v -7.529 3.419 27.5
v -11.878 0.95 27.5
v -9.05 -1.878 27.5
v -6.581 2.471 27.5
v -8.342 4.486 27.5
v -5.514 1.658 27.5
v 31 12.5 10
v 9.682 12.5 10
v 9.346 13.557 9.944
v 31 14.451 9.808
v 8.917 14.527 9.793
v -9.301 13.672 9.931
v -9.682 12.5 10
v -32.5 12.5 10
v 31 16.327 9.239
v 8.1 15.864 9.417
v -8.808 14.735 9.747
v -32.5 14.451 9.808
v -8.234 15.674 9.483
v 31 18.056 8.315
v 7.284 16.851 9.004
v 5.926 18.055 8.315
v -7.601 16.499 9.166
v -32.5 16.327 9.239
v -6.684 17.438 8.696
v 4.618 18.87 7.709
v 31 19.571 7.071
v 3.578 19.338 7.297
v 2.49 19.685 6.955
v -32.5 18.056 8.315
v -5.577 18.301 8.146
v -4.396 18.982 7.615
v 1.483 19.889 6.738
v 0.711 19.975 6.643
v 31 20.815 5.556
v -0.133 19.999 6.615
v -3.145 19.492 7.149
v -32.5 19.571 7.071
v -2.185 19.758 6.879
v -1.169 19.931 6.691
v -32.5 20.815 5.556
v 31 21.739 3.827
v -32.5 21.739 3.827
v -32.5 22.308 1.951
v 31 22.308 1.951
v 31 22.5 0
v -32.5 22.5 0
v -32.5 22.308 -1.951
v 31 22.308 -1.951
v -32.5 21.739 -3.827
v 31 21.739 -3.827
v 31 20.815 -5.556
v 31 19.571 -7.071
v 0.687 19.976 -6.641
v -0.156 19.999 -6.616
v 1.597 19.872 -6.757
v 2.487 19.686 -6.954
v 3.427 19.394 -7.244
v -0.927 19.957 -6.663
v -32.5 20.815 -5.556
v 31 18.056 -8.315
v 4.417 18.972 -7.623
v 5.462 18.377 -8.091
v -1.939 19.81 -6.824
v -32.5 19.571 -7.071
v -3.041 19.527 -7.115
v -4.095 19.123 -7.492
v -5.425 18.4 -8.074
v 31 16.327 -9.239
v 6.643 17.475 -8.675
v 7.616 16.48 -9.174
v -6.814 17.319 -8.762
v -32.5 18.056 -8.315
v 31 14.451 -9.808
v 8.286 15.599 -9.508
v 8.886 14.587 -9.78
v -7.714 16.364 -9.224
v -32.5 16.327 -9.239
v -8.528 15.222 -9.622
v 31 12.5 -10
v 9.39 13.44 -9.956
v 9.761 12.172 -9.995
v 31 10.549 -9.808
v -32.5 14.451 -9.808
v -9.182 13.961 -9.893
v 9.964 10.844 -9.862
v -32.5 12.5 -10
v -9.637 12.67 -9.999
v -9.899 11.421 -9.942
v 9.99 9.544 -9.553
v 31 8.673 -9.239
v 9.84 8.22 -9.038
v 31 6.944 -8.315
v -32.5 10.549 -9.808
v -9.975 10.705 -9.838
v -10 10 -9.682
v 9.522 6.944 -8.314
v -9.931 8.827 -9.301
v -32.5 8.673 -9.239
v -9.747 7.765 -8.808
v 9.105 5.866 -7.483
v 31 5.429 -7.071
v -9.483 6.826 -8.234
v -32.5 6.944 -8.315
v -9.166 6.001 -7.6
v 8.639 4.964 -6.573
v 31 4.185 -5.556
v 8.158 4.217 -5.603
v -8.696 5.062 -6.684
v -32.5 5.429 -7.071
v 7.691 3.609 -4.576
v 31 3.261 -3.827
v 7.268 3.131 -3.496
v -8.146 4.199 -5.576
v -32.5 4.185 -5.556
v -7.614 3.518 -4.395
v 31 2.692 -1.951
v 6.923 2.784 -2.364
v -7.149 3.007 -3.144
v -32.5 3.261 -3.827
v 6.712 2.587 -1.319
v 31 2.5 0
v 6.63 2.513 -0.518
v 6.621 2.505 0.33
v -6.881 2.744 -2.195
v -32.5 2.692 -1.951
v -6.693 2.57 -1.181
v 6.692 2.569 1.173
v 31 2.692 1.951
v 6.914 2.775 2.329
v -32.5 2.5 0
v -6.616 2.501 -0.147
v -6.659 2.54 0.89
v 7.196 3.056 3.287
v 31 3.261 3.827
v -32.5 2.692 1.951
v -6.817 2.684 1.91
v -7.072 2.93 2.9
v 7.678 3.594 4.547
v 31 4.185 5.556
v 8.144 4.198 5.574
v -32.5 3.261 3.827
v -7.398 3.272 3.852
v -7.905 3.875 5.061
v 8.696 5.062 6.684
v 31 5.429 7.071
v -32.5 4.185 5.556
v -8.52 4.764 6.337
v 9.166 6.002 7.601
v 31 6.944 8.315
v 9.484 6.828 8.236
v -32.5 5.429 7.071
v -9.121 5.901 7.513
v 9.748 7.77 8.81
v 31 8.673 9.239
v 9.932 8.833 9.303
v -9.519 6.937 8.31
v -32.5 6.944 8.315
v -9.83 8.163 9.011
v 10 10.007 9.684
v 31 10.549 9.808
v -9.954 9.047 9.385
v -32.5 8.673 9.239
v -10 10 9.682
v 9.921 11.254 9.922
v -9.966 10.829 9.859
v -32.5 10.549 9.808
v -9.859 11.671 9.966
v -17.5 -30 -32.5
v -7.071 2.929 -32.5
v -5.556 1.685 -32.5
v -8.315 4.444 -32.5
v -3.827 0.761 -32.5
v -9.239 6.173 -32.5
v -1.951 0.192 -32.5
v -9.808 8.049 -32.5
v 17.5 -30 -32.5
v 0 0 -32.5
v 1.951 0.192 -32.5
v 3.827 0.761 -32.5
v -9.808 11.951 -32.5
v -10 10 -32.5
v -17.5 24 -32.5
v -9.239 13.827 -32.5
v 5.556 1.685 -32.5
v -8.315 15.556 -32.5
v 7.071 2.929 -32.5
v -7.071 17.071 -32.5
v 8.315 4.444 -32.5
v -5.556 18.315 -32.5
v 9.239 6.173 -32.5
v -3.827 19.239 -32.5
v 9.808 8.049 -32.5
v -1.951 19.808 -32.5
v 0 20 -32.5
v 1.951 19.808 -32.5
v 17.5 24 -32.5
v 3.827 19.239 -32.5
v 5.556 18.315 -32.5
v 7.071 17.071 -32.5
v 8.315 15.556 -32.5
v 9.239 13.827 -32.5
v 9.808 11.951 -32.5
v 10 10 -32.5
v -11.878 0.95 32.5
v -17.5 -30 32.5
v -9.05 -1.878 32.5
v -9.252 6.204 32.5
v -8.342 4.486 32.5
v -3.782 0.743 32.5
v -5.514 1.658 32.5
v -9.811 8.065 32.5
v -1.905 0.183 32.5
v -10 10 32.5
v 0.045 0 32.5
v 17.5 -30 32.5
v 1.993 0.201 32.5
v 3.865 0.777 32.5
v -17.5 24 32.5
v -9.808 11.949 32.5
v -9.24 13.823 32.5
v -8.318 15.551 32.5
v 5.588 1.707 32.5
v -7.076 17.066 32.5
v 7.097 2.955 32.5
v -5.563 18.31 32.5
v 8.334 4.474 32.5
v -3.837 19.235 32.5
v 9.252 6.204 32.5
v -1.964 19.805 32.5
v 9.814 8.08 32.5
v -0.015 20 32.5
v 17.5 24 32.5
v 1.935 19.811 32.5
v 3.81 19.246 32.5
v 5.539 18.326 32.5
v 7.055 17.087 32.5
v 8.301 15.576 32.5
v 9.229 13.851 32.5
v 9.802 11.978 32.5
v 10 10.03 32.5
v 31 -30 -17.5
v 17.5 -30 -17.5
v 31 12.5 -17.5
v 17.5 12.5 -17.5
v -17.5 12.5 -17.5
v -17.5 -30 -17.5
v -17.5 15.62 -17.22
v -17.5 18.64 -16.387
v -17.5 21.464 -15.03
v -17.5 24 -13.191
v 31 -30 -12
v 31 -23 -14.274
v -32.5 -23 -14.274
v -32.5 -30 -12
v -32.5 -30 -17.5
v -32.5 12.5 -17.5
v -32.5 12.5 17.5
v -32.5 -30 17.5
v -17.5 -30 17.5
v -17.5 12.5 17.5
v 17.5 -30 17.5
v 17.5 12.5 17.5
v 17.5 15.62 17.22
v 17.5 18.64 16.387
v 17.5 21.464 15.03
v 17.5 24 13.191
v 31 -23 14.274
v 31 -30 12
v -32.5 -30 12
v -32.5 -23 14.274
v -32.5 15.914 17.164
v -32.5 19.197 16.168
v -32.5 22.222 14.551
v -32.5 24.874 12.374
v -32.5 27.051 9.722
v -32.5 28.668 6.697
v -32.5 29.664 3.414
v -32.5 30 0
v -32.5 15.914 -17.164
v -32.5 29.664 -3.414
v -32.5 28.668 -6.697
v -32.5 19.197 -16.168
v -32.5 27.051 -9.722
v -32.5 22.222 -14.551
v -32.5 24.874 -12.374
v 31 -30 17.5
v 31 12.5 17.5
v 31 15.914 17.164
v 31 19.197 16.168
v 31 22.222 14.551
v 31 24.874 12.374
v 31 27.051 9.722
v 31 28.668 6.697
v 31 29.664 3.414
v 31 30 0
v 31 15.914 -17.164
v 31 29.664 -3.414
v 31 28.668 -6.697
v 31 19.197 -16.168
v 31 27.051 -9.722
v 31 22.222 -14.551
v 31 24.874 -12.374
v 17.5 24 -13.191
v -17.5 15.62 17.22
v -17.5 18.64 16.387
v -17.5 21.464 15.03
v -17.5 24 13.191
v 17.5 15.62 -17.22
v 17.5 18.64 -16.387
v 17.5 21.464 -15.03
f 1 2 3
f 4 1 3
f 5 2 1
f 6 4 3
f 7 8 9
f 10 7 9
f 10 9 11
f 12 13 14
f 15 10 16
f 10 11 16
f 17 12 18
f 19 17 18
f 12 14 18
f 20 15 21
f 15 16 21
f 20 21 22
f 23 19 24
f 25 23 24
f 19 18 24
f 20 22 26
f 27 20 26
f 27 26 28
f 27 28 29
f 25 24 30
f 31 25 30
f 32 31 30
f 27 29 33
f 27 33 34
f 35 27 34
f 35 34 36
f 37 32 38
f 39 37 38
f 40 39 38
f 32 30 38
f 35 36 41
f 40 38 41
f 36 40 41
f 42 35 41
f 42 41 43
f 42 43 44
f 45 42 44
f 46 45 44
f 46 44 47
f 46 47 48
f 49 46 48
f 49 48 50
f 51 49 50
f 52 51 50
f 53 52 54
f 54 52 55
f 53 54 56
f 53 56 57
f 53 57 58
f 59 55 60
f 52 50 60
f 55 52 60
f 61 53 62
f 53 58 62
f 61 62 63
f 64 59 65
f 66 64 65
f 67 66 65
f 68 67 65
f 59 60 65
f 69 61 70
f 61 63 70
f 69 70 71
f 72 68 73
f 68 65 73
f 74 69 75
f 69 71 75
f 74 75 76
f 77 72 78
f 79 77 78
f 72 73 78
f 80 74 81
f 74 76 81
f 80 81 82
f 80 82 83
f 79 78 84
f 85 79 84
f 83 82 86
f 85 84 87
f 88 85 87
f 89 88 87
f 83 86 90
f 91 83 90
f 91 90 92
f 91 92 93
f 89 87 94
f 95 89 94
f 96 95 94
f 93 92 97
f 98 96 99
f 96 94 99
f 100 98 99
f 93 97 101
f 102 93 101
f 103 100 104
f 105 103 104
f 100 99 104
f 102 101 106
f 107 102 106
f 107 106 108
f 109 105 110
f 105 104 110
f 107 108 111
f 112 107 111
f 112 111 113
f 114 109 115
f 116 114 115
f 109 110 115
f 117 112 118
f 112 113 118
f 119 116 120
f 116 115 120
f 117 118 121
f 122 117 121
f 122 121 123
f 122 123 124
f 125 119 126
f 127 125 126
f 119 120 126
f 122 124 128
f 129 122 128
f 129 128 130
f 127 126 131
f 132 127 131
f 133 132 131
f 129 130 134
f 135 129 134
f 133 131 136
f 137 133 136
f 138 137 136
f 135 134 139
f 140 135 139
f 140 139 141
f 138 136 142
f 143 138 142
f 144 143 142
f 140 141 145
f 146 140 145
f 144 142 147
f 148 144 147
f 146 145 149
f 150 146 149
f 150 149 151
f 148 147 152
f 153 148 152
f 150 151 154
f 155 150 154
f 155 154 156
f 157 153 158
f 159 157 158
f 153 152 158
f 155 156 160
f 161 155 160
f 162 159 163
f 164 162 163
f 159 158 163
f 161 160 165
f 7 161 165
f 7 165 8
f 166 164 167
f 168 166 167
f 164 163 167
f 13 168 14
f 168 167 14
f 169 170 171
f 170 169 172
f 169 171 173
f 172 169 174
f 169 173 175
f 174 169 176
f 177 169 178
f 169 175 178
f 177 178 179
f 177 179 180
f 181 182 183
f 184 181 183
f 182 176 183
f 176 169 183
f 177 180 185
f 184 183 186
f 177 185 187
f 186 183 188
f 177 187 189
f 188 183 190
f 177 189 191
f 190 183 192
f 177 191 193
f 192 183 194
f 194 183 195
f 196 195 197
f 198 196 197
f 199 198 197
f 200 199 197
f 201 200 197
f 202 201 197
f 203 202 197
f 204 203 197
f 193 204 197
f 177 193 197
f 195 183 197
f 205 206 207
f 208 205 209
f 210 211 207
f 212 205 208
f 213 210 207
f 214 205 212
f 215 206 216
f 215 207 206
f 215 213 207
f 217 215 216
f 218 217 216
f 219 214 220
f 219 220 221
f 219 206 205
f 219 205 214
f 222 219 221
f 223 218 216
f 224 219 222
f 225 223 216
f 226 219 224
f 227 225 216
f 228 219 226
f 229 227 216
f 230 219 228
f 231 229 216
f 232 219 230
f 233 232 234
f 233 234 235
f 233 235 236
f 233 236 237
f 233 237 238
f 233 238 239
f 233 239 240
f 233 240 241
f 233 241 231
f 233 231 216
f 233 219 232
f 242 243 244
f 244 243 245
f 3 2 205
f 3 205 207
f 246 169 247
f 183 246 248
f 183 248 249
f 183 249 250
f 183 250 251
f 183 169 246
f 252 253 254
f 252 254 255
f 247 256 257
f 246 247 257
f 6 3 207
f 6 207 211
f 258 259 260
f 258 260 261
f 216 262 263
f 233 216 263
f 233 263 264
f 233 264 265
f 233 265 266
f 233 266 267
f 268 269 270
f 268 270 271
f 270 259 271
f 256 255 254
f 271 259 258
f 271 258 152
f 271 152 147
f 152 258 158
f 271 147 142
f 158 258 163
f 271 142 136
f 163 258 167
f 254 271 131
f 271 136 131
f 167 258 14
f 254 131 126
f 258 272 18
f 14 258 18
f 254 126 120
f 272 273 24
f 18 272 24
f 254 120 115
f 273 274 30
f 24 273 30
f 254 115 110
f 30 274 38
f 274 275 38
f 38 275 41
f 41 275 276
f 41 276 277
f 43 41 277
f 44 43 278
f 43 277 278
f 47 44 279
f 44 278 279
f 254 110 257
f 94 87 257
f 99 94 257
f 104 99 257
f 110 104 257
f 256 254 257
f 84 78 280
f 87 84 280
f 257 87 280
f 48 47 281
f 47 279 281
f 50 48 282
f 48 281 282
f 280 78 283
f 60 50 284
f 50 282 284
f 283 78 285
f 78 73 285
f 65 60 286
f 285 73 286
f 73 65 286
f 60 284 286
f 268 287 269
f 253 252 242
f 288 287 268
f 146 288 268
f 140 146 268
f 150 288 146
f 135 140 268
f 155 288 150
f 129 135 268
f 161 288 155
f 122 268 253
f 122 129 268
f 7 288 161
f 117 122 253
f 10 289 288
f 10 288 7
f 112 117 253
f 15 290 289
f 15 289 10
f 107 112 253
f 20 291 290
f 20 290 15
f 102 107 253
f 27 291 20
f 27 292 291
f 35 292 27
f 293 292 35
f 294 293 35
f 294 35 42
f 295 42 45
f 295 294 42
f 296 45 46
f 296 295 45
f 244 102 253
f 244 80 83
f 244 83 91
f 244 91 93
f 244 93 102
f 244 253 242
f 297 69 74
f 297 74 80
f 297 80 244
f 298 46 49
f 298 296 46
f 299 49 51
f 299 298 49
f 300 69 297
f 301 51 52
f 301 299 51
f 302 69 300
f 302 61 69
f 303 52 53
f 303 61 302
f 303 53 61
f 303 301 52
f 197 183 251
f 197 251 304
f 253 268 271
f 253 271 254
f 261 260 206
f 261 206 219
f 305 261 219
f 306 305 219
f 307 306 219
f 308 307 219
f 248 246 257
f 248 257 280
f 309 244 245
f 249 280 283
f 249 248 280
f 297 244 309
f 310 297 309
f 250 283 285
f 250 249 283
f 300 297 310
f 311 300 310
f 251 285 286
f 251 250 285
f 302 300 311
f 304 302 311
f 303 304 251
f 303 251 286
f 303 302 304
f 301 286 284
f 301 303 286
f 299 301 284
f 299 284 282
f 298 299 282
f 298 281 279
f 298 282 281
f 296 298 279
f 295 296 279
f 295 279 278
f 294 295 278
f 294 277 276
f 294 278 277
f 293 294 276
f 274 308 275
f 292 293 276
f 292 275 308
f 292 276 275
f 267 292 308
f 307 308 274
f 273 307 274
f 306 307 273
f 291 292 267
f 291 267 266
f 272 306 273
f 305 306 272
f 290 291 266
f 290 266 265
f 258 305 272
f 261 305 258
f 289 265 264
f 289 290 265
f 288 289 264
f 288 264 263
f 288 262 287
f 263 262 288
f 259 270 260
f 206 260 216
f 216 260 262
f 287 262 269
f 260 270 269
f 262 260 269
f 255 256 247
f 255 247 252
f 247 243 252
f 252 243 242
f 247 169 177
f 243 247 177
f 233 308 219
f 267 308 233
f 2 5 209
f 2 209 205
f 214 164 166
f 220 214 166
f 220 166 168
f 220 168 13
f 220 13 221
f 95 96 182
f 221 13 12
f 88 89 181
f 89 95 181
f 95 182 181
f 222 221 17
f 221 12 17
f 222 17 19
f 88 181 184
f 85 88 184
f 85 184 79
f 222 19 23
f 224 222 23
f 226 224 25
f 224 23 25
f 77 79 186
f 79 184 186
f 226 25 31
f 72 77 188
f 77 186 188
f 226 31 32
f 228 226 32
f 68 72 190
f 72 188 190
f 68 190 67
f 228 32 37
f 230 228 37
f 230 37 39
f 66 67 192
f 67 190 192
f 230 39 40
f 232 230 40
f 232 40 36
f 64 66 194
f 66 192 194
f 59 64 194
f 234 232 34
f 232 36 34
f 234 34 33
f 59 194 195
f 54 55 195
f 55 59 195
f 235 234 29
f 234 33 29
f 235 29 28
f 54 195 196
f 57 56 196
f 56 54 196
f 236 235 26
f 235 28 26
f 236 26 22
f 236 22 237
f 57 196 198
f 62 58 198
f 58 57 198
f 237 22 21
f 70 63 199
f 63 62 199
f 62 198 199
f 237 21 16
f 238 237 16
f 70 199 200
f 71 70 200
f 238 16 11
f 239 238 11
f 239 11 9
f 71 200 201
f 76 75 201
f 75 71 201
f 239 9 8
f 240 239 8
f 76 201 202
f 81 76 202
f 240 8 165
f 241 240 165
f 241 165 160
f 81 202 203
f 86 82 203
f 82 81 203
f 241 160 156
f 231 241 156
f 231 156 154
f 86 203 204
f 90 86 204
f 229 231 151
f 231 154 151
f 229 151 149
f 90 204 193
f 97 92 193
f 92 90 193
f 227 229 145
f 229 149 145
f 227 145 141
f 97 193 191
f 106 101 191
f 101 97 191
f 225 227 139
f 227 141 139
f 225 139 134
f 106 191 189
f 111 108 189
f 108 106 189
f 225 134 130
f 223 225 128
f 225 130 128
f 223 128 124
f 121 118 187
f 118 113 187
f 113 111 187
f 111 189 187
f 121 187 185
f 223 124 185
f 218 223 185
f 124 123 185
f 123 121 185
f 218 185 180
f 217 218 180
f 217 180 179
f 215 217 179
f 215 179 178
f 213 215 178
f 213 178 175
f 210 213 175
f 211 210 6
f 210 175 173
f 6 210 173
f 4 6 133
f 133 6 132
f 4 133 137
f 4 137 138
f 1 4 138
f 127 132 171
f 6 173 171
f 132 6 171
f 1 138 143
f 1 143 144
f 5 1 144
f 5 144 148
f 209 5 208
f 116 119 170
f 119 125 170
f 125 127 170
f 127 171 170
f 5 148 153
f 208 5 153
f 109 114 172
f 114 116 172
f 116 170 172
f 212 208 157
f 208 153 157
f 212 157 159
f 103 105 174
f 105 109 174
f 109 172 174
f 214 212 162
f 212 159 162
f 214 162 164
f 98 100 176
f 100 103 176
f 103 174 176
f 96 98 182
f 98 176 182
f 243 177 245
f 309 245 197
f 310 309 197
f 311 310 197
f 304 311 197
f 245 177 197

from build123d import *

# Parameters (mm, degrees)
BOSS_EXTRUDE1_DEPTH      = 31
BOSS_EXTRUDE1_DEPTH_BACK = 32.5
SKETCH1_W                = 35
SKETCH1_H                = 60
FILLET2_RADIUS           = 17.5
FILLET2_LENGTH           = 63.5
BOSS_EXTRUDE2_DEPTH      = 32.5
BOSS_EXTRUDE2_DEPTH_BACK = 32.5
SKETCH8_W                = 35
SKETCH8_H                = 54
HOLE2_D                  = 20
CUT_EXTRUDE1_START       = -5
CUT_EXTRUDE1_DEPTH       = 5
CUT_EXTRUDE2_DEPTH       = 78.38539914
HOLE3_D                  = 20


with BuildPart() as part:
    # Sketch1 → Boss-Extrude1 (new, two sides: drawn at the far end of the back side and taken through both)
    with BuildSketch(Plane(origin=(0, 0, 0), x_dir=(0, 0, -1), z_dir=(1, 0, 0)).offset(-BOSS_EXTRUDE1_DEPTH_BACK)):
        Rectangle(SKETCH1_W, SKETCH1_H)
    extrude(amount=BOSS_EXTRUDE1_DEPTH + BOSS_EXTRUDE1_DEPTH_BACK)

    # Fillet2: full round fillet: the end face becomes a half cylinder, R = half its width
    fillet2_face = Plane((-0.75, 30, 0), x_dir=(1, 0, 0), z_dir=(0, 1, 0))  # on the end face: x along it, z out of the body
    fillet2_slab = fillet2_face.offset(-FILLET2_RADIUS / 2) * Box(FILLET2_LENGTH, 2 * FILLET2_RADIUS, FILLET2_RADIUS, mode=Mode.PRIVATE)  # the body's end, R deep
    fillet2_round = Plane((-0.75, 12.5, 0), x_dir=(0, 1, 0), z_dir=(1, 0, 0)) * Cylinder(FILLET2_RADIUS, FILLET2_LENGTH, mode=Mode.PRIVATE)  # its axis R under the face
    add(fillet2_slab - fillet2_round, mode=Mode.SUBTRACT)

    # Sketch8 → Boss-Extrude2 (add, two sides: drawn at the far end of the back side and taken through both)
    with BuildSketch(Plane.XY.offset(-BOSS_EXTRUDE2_DEPTH_BACK)):
        with Locations((0, -3)):
            Rectangle(SKETCH8_W, SKETCH8_H)
    extrude(amount=BOSS_EXTRUDE2_DEPTH + BOSS_EXTRUDE2_DEPTH_BACK)

    # Hole2 (through all)
    with Locations(Plane.XY.offset(32.5)):
        with Locations((0, 10)):
            Hole(HOLE2_D / 2)

    # Sketch14 → Cut-Extrude1 (cut)
    with BuildSketch(Plane.XY.offset(32.5).offset(CUT_EXTRUDE1_START)):
        with BuildLine():
            Line((-8.342416793, 4.486010332), (-11.877950699, 0.950476426))
            Line((-11.877950699, 0.950476426), (-9.049523574, -1.877950699))
            Line((-9.049523574, -1.877950699), (-5.513989668, 1.657583207))
            ThreePointArc((-5.513989668, 1.657583207), (-7.071067812, 2.928932188), (-8.342416793, 4.486010332))
        make_face()
    extrude(amount=CUT_EXTRUDE1_DEPTH, mode=Mode.SUBTRACT)

    # Sketch15 → Cut-Extrude2 (cut, through all)
    with BuildSketch(Plane(origin=(31, 0, 0), x_dir=(0, 0, -1), z_dir=(1, 0, 0))):
        Polygon((-12, -30), (-14.274437874, -23), (14.274437874, -23), (12, -30), align=None)
    extrude(amount=-CUT_EXTRUDE2_DEPTH, mode=Mode.SUBTRACT)

    # Hole3 (through all)
    with Locations(Plane(origin=(31, 0, 0), x_dir=(0, 0, -1), z_dir=(1, 0, 0))):
        with Locations((0, 12.5)):
            Hole(HOLE3_D / 2)


solid = part.part
